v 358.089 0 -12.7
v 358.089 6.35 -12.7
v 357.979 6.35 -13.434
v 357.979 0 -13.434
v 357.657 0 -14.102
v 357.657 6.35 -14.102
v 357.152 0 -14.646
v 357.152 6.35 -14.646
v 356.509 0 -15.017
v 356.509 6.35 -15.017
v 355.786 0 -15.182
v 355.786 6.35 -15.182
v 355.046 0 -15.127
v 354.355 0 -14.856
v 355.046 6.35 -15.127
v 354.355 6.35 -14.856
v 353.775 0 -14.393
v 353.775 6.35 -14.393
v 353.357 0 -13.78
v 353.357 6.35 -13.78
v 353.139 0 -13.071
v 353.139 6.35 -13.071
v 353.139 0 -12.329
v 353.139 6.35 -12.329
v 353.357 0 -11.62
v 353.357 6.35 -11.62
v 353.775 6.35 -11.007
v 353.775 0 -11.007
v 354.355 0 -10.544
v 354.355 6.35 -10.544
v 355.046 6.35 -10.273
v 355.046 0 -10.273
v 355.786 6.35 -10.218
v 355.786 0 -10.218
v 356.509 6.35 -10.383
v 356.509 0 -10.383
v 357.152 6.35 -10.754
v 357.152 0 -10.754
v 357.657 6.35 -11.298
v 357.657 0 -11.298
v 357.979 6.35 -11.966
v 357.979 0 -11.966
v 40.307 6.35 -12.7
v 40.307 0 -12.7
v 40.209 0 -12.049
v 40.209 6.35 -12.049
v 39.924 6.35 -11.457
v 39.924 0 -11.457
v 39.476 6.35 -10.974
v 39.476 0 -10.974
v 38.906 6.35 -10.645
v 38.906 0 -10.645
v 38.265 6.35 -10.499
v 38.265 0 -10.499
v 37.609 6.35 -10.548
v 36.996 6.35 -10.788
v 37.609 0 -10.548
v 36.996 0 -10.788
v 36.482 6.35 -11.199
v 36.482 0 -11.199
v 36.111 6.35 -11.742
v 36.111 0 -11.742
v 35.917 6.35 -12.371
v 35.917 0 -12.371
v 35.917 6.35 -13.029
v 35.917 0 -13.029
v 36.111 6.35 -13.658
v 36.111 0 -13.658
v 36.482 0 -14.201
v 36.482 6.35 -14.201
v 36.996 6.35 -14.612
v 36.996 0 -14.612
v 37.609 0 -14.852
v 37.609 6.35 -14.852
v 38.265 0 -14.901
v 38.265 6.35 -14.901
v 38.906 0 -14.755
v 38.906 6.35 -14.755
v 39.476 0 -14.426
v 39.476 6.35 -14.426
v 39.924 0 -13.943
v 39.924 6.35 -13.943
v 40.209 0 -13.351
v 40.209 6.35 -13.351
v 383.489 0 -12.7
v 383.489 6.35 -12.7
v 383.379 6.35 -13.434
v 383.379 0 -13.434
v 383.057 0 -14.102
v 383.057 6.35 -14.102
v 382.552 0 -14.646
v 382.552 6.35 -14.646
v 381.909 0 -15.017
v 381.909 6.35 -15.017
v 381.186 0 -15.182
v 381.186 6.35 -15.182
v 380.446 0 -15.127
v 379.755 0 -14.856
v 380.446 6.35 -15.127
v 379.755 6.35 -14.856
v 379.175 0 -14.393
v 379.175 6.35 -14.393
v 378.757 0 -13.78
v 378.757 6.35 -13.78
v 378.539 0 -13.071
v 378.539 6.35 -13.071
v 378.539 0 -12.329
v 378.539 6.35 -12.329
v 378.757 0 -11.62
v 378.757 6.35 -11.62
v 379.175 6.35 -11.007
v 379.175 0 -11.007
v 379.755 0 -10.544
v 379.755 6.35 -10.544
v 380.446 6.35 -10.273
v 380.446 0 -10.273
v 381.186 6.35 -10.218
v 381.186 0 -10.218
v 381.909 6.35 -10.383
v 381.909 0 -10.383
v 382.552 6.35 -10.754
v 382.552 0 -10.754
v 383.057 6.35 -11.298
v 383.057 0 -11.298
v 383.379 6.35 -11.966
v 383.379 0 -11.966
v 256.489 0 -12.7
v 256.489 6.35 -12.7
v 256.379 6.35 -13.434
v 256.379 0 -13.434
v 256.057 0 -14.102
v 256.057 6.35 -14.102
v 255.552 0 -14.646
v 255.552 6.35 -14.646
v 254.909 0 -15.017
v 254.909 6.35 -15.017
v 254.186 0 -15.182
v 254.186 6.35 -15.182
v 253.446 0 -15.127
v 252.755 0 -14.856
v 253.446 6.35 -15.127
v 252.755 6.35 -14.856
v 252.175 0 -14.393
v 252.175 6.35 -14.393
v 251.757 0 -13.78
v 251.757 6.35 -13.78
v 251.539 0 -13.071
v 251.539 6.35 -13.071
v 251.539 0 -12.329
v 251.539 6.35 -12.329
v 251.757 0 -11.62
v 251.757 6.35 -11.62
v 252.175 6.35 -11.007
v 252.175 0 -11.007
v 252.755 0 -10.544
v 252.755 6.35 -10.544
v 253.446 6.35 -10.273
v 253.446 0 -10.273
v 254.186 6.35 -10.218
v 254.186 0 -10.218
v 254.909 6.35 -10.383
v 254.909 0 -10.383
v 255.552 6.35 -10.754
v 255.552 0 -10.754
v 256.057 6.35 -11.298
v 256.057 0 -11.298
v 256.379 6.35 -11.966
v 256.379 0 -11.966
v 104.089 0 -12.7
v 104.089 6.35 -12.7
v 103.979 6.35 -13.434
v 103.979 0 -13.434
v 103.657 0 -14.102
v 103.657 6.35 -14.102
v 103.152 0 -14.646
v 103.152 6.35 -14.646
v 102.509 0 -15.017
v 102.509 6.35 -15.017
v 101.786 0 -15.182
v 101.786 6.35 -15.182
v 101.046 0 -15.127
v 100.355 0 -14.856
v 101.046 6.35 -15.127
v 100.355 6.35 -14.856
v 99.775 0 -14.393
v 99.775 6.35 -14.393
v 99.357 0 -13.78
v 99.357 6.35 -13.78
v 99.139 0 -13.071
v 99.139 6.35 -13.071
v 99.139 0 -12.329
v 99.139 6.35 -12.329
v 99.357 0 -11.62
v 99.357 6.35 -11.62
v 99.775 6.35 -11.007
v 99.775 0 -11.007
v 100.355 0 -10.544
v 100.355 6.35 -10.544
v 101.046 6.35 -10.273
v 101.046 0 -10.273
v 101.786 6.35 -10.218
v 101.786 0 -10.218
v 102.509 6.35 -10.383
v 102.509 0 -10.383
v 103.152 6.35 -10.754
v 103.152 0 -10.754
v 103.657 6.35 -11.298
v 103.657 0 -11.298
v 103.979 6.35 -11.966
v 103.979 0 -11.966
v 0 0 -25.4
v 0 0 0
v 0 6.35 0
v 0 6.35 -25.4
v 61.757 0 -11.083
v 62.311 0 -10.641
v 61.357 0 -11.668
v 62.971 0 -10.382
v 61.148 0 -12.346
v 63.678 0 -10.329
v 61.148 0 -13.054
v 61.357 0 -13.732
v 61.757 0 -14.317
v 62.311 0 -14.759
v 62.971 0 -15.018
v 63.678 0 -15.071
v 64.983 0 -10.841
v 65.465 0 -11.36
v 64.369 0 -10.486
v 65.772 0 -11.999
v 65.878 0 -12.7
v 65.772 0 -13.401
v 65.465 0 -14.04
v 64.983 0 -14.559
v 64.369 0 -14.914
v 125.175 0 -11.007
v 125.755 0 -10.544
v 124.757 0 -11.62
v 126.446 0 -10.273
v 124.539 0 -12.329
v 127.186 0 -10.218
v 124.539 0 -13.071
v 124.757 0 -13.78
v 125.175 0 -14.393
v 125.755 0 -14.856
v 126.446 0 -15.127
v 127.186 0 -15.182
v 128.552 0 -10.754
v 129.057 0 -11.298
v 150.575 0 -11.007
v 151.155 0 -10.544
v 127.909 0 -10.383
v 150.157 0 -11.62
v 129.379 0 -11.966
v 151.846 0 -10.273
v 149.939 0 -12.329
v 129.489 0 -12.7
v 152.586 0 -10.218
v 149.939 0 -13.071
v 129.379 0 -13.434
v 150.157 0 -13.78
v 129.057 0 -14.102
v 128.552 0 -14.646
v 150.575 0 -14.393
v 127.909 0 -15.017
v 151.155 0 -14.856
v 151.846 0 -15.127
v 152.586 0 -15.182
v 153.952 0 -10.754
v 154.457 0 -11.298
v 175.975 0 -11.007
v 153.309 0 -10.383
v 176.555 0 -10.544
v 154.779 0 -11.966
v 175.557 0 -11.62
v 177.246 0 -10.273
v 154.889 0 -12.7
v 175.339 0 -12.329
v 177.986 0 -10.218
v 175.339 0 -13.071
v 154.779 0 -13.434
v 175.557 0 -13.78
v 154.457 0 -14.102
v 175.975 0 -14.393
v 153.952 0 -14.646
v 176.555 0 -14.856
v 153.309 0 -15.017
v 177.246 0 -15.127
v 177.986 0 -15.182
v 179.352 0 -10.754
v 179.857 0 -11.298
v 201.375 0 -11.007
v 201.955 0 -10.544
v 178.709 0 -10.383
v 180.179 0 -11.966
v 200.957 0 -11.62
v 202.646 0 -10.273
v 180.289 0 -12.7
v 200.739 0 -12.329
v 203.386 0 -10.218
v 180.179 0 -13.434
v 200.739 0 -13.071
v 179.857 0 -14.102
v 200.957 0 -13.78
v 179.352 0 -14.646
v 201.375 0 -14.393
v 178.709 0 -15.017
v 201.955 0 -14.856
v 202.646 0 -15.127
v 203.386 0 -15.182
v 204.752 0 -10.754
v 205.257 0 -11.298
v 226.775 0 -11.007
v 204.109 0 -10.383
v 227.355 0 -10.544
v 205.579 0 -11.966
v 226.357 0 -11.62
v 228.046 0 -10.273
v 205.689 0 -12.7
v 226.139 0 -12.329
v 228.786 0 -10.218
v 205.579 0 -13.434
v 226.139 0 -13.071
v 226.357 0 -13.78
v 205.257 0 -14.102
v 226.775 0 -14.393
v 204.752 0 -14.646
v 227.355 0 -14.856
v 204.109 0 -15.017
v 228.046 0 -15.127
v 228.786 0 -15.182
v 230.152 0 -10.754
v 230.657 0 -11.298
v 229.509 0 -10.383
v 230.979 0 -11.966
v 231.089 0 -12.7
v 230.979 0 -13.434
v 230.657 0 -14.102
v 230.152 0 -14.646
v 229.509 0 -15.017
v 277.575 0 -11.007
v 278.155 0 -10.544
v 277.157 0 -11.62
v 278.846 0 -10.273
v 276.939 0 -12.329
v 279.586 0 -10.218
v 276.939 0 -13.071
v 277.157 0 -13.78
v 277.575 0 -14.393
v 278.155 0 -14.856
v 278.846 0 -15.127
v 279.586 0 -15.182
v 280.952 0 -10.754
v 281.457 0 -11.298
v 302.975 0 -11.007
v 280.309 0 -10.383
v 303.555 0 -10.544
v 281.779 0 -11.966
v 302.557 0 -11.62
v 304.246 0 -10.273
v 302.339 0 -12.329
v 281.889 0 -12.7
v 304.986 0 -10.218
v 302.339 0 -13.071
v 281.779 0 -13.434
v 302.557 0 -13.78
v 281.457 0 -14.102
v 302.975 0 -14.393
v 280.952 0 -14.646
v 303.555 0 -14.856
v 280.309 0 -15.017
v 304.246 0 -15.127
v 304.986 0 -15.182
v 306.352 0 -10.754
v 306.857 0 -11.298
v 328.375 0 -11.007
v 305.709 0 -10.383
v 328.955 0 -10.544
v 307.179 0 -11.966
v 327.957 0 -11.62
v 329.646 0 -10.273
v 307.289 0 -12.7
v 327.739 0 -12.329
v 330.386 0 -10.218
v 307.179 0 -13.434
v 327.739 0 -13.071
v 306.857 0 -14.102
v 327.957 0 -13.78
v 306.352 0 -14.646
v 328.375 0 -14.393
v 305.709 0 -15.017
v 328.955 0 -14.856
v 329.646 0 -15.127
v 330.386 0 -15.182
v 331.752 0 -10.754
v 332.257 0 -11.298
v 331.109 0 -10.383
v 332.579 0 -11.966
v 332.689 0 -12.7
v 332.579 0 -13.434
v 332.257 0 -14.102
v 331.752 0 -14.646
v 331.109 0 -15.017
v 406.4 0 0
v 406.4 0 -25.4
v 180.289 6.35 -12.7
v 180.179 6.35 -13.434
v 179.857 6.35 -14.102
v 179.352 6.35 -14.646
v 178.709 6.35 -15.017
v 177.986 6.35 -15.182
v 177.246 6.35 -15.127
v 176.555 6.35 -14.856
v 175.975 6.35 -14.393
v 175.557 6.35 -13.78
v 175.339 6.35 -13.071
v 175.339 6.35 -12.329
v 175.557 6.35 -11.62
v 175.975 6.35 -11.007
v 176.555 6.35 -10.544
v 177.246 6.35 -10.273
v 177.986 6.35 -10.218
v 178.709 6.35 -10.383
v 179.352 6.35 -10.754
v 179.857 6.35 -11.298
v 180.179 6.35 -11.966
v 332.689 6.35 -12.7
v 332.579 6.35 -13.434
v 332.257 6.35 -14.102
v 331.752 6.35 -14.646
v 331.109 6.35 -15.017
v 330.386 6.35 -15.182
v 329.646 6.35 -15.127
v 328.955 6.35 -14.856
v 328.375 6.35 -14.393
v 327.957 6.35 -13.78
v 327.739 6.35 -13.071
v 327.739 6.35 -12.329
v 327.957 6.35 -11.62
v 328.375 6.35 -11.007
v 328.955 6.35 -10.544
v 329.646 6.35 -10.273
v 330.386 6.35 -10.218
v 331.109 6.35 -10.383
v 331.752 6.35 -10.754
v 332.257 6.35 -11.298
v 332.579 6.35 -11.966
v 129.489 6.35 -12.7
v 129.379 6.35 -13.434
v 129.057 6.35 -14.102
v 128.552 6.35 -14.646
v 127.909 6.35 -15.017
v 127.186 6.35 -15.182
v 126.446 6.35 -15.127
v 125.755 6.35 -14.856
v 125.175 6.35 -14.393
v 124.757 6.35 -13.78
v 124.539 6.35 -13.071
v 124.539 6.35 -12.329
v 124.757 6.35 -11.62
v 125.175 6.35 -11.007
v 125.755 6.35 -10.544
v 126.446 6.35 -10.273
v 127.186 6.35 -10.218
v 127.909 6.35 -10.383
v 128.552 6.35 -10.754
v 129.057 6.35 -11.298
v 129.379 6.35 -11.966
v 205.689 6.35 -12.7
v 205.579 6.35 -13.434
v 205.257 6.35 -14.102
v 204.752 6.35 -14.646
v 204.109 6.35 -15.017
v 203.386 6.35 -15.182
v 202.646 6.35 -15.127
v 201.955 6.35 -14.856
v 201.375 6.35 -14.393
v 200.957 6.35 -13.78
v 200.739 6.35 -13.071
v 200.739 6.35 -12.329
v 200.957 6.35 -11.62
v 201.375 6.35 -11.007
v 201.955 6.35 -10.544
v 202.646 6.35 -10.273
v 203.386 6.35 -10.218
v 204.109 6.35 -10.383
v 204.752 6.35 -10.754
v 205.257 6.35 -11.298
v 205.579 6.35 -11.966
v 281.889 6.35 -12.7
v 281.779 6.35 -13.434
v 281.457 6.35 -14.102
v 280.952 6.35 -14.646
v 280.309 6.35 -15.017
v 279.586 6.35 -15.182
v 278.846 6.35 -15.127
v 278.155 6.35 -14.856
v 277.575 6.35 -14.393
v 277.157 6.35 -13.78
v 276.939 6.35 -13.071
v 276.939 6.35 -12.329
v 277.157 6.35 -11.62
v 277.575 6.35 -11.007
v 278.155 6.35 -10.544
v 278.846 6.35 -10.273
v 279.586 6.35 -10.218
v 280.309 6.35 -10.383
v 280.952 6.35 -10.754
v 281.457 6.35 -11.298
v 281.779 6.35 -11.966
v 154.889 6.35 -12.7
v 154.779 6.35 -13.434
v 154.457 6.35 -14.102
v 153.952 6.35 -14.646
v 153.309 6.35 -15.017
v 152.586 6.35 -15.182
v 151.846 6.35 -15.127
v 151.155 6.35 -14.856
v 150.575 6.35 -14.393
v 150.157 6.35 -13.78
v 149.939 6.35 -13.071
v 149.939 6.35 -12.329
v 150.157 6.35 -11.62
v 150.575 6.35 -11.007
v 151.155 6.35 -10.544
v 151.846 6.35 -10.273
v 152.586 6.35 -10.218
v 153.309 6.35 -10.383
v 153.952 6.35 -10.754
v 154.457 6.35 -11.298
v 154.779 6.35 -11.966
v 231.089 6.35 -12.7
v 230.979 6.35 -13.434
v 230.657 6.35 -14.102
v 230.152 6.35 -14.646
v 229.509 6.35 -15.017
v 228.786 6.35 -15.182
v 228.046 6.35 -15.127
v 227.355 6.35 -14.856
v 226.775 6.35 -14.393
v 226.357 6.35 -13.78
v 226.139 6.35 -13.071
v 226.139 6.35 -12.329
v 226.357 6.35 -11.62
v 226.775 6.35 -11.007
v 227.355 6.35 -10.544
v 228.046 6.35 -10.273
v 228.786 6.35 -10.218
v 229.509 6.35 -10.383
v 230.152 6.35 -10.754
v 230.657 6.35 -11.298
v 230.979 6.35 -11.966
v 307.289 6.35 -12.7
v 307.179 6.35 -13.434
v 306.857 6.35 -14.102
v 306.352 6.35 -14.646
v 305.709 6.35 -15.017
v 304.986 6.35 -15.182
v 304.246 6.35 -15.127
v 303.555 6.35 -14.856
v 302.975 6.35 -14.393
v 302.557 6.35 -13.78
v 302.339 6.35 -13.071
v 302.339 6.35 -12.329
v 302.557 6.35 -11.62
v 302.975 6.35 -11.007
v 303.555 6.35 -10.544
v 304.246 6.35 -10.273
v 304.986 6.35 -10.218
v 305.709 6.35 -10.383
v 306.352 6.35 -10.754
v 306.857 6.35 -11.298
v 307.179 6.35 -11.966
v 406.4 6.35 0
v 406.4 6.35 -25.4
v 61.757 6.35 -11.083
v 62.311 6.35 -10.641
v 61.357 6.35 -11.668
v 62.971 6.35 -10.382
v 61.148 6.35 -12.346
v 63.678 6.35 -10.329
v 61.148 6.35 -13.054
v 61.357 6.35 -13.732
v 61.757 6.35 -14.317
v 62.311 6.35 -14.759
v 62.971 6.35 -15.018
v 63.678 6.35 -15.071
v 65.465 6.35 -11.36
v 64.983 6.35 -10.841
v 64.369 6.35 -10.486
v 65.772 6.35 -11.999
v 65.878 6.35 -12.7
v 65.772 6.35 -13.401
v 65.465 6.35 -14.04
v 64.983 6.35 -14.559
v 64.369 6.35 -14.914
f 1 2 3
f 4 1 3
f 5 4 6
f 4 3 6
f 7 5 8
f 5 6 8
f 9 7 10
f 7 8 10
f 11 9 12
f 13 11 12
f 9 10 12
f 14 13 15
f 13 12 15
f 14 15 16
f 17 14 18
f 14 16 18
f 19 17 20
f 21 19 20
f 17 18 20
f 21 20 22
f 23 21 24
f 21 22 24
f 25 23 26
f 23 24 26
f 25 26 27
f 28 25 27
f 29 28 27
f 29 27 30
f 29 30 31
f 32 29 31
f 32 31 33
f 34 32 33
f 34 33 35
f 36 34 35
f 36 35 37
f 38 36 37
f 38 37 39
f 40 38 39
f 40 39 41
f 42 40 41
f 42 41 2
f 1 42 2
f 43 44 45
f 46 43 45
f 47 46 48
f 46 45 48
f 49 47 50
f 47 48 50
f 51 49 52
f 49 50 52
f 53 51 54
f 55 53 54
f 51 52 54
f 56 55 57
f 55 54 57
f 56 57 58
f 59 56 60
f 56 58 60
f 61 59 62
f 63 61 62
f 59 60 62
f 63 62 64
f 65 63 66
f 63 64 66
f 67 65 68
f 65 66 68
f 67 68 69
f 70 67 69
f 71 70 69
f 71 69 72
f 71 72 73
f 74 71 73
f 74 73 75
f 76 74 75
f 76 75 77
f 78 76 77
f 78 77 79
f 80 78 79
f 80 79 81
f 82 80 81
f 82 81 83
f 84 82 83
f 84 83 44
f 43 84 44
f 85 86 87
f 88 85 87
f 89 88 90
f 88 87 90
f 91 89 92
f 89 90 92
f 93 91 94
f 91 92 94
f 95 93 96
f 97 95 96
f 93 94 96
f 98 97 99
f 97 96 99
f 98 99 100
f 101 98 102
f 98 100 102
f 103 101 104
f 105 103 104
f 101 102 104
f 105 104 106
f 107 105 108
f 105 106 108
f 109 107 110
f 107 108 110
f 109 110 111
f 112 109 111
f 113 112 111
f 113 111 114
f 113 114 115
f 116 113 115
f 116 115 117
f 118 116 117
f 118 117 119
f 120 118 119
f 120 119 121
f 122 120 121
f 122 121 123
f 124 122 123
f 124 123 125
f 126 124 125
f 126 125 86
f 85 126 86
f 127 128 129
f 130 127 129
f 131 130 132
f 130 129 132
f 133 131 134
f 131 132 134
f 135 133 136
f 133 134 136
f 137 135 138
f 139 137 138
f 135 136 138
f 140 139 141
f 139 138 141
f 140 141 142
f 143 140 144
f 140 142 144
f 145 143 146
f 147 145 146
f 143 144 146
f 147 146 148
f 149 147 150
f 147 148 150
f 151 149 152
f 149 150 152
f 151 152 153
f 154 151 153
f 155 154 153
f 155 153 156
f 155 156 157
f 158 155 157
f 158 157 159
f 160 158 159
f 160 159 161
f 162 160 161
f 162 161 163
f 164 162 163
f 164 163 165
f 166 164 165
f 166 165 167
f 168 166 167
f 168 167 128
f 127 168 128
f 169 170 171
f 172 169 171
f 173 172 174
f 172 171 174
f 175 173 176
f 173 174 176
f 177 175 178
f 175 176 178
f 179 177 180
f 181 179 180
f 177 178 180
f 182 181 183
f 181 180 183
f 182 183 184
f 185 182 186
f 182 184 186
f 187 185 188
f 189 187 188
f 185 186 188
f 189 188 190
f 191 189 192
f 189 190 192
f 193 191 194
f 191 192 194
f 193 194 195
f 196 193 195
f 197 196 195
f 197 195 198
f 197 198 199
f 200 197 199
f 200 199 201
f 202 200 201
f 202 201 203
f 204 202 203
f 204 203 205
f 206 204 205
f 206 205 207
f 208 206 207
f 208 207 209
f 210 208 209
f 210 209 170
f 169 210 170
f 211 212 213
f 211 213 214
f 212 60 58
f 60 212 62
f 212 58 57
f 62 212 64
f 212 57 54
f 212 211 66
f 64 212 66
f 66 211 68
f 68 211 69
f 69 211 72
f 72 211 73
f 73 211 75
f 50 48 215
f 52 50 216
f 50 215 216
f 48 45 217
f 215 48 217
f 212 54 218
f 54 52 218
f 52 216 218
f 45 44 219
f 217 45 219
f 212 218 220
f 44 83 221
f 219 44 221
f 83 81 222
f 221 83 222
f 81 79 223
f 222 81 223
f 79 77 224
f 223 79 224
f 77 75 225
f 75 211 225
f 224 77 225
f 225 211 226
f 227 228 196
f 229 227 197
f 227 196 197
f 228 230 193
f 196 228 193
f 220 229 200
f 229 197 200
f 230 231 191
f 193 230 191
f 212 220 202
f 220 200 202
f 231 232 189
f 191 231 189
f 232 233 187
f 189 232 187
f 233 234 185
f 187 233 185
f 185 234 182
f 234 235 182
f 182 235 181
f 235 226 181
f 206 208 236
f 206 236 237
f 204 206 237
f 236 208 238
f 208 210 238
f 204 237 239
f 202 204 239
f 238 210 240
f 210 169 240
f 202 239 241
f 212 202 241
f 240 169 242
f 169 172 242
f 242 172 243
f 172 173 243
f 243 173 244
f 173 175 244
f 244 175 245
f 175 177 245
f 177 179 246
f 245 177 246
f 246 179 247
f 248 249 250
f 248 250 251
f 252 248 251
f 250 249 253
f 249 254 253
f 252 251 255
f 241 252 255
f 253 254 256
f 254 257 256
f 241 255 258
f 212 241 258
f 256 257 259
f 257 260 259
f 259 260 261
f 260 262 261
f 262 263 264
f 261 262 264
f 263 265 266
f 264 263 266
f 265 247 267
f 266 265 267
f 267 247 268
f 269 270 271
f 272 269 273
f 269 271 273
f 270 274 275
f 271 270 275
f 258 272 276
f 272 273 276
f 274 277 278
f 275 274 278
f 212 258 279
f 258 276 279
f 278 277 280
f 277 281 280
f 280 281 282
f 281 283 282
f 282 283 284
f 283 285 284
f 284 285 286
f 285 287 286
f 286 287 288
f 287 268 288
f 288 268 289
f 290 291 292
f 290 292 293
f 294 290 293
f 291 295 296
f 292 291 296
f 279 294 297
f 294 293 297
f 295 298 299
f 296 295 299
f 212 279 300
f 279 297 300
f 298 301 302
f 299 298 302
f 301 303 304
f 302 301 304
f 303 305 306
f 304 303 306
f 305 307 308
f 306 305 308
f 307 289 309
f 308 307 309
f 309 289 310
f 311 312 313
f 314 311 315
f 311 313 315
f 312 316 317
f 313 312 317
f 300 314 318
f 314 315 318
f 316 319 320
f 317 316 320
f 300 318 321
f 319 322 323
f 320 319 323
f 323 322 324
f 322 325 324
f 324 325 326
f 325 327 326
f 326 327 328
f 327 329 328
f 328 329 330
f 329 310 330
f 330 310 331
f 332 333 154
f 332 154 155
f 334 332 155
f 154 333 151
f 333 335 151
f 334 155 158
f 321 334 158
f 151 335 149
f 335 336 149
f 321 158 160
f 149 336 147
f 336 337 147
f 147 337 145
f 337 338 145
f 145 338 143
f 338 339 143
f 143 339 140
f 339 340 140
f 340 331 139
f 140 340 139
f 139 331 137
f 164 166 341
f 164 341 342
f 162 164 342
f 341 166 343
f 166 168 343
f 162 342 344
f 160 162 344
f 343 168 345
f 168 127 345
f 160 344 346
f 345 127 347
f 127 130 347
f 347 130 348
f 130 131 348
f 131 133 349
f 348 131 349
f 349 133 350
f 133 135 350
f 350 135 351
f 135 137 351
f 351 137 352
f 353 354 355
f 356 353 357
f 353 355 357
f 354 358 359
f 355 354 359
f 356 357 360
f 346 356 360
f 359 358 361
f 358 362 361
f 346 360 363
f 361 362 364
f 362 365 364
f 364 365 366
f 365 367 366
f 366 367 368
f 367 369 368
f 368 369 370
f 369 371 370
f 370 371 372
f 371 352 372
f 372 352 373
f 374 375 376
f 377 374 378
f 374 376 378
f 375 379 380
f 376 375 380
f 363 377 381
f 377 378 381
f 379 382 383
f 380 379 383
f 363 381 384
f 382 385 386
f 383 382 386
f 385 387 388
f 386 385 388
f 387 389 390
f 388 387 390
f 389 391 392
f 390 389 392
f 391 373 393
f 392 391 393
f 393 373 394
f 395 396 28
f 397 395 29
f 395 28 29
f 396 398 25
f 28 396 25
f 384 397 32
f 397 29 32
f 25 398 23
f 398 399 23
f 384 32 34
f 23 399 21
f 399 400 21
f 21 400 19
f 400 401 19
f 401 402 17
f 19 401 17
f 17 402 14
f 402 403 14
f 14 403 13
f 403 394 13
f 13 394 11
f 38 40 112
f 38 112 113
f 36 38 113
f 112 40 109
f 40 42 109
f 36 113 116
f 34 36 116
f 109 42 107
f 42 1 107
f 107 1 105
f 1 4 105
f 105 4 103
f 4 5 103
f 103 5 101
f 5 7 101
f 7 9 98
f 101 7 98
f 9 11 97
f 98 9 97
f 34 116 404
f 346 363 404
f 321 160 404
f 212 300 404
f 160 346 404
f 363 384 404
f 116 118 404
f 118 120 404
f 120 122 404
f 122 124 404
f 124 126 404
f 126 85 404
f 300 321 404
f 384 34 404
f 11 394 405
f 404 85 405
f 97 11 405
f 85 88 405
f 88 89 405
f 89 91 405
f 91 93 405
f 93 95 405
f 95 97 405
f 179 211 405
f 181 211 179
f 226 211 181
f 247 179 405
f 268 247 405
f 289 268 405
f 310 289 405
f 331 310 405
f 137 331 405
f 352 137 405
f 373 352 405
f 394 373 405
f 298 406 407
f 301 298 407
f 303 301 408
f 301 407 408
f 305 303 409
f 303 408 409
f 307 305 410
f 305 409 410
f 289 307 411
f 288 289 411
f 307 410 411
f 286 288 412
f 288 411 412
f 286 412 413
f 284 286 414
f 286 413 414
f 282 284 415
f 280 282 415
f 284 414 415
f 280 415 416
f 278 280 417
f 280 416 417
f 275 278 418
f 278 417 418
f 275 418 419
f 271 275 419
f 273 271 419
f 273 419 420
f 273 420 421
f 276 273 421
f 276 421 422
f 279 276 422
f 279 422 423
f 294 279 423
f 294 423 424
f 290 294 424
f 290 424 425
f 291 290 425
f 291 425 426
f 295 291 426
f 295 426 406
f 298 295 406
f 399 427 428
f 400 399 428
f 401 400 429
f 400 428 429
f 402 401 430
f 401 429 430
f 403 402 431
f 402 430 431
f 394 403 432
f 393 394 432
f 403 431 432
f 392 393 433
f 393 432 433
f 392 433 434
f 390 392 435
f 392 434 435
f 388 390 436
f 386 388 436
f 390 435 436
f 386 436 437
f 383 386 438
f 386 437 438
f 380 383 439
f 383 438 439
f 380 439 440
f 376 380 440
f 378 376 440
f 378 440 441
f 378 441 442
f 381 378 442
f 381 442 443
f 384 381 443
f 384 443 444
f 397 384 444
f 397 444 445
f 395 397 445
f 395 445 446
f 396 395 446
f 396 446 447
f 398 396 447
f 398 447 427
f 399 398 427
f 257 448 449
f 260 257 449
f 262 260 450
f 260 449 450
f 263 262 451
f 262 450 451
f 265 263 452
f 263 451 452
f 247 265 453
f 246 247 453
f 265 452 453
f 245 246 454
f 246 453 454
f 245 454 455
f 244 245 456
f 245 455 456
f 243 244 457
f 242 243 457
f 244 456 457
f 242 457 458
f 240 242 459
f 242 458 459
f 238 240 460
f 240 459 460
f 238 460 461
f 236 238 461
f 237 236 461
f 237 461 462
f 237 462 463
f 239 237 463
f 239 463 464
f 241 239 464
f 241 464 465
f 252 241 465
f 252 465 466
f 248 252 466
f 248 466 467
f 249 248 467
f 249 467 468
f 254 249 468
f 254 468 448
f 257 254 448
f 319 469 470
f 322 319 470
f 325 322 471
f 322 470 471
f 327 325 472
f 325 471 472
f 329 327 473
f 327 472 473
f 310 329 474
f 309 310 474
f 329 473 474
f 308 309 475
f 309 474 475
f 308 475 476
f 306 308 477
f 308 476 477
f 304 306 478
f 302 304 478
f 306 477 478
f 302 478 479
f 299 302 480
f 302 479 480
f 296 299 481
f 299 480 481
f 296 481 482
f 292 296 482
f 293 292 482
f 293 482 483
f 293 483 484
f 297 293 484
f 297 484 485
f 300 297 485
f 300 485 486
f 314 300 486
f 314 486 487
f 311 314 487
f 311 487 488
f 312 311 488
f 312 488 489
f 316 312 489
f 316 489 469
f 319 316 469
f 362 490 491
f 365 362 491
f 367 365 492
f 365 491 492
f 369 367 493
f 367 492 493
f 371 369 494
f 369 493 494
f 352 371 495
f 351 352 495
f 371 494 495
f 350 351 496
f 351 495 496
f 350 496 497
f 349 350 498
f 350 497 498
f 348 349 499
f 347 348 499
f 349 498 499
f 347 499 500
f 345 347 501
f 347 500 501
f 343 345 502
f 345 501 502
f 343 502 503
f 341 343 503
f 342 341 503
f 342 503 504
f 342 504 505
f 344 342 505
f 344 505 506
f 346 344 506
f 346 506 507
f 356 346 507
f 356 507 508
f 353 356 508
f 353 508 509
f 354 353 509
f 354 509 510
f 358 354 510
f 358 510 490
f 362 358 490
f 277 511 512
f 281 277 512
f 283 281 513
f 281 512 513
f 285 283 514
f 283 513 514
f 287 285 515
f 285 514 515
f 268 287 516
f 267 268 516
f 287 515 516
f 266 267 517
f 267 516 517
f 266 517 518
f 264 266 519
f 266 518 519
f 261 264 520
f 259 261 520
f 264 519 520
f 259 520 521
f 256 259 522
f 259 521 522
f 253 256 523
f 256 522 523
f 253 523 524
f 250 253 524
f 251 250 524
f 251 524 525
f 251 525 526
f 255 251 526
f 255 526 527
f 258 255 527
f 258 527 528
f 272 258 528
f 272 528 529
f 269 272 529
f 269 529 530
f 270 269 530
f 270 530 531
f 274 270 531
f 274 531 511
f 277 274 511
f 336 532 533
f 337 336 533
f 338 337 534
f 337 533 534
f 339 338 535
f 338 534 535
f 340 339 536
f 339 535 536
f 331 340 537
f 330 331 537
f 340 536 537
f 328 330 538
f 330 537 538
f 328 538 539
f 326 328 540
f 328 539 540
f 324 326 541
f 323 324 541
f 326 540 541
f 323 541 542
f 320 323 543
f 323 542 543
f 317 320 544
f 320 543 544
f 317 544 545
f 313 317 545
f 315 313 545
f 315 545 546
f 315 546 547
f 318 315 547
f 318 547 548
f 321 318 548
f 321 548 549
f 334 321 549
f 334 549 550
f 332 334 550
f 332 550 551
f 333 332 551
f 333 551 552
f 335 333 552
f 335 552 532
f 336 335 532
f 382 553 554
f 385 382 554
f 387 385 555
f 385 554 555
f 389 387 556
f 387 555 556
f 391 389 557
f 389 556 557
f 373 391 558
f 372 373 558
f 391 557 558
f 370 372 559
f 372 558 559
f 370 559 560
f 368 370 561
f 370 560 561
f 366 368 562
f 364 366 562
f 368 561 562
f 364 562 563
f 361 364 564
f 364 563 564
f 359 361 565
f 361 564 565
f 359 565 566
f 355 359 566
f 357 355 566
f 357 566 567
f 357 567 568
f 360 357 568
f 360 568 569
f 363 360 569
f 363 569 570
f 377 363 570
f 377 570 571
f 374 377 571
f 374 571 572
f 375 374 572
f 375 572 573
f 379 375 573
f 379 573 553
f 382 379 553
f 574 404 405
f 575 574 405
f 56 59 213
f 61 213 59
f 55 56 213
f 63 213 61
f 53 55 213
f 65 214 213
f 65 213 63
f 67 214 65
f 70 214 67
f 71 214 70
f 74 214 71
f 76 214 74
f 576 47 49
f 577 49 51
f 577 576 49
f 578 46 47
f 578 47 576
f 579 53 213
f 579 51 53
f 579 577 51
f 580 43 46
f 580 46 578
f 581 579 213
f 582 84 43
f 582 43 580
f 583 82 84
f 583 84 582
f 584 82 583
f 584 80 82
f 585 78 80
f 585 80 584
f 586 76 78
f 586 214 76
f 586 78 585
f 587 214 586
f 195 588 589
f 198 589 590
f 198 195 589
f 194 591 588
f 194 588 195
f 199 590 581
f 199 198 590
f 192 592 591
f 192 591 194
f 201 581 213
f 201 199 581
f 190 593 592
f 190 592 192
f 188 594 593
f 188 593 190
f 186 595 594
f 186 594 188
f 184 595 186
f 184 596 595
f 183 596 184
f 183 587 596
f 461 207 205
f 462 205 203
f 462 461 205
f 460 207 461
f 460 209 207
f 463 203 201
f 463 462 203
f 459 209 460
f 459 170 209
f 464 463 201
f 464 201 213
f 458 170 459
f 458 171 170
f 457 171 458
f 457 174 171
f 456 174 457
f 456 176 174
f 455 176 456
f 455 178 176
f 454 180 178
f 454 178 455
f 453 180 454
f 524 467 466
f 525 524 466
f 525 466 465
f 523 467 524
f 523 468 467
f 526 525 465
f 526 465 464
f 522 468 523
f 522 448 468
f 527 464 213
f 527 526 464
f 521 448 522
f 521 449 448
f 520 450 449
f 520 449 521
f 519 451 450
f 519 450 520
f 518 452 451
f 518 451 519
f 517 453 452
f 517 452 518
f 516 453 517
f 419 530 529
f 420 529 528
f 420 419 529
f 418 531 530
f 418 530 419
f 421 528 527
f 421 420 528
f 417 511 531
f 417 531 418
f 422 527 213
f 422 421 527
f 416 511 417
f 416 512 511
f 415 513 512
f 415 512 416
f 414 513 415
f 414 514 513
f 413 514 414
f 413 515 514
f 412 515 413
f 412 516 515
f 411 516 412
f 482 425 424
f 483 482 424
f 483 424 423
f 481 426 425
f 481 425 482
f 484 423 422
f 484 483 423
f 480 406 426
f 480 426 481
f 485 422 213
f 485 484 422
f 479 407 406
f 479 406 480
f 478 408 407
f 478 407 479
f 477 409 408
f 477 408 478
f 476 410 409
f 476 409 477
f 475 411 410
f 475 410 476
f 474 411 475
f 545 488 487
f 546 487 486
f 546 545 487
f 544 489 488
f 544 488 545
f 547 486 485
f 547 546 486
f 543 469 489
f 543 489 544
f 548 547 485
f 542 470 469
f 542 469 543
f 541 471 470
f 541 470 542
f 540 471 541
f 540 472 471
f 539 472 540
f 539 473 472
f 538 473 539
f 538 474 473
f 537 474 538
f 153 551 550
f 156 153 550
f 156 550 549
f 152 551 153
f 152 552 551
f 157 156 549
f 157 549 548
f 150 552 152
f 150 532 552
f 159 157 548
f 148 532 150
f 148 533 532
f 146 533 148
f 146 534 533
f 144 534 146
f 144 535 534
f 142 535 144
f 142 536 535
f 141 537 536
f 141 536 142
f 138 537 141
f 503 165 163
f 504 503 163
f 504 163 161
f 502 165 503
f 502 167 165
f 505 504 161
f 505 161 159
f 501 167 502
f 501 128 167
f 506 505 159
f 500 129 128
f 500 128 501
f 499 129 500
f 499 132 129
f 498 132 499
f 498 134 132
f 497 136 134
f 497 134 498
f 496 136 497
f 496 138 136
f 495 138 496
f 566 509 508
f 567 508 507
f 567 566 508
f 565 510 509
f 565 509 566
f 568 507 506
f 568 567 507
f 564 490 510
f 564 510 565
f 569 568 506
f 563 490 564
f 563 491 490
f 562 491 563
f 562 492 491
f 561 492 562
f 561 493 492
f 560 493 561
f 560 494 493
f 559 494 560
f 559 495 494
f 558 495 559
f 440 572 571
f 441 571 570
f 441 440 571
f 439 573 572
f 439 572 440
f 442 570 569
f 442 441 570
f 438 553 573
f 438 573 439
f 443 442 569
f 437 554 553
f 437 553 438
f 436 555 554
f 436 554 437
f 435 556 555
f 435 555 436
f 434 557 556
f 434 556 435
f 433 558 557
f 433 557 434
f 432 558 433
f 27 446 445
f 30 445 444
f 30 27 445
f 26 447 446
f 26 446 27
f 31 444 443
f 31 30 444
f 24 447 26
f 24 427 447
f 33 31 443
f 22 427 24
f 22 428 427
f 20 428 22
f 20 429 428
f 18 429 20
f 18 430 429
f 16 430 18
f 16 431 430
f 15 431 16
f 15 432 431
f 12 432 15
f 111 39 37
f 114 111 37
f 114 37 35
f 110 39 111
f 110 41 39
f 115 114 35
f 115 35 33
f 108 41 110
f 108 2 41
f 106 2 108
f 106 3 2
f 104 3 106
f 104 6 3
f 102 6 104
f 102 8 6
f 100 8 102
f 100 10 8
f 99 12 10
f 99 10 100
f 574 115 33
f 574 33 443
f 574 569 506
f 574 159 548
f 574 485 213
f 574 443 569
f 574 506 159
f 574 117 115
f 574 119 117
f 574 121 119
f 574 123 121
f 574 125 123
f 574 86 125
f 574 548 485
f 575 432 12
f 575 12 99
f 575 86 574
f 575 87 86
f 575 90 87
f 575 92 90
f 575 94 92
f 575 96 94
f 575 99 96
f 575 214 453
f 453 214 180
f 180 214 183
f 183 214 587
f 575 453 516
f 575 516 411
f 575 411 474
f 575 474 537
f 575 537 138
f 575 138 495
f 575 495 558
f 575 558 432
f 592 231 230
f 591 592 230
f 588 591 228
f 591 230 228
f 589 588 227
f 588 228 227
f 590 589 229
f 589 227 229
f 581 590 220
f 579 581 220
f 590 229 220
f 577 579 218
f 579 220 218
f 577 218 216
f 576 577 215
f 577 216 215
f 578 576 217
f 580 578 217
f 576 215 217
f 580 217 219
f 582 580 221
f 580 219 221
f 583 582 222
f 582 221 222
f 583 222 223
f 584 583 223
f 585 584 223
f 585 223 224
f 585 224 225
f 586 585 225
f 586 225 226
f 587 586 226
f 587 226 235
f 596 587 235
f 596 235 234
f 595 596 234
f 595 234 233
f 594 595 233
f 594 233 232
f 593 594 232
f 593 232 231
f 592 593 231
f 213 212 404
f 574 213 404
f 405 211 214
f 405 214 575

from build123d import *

# Parameters (mm, degrees)
SKETCH1_W               = 406.4
SKETCH1_H               = 25.4
BOSS_EXTRUDE1_DEPTH     = 6.35
SKETCH2_R               = 2.4892
CUT_EXTRUDE1_DEPTH      = 1
CUT_EXTRUDE1_DEPTH_BACK = 7.35
SKETCH3_R               = 2.378070279
SKETCH3_R_2             = 2.20737703
CUT_EXTRUDE2_DEPTH      = 7.35


with BuildPart() as part:
    # Sketch1 → Boss-Extrude1 (new body)
    with BuildSketch(Plane(origin=(0, 0, 0), x_dir=(1, 0, 0), z_dir=(0, 1, 0))):
        with Locations((203.2, 12.7)):
            Rectangle(SKETCH1_W, SKETCH1_H)
    extrude(amount=BOSS_EXTRUDE1_DEPTH)

    # Sketch2 → Cut-Extrude1 (cut, two sides)
    with BuildSketch(Plane(origin=(0, 6.35, 0), x_dir=(1, 0, 0), z_dir=(0, 1, 0))) as cut_extrude1_sk:
        with Locations((381, 12.7)):
            Circle(SKETCH2_R)
        with Locations((355.6, 12.7)):
            Circle(SKETCH2_R)
        with Locations((330.2, 12.7)):
            Circle(SKETCH2_R)
        with Locations((304.8, 12.7)):
            Circle(SKETCH2_R)
        with Locations((279.4, 12.7)):
            Circle(SKETCH2_R)
        with Locations((254, 12.7)):
            Circle(SKETCH2_R)
        with Locations((228.6, 12.7)):
            Circle(SKETCH2_R)
        with Locations((203.2, 12.7)):
            Circle(SKETCH2_R)
        with Locations((177.8, 12.7)):
            Circle(SKETCH2_R)
        with Locations((152.4, 12.7)):
            Circle(SKETCH2_R)
        with Locations((127, 12.7)):
            Circle(SKETCH2_R)
        with Locations((101.6, 12.7)):
            Circle(SKETCH2_R)
    extrude(amount=CUT_EXTRUDE1_DEPTH, mode=Mode.SUBTRACT)
    extrude(cut_extrude1_sk.sketch, amount=-CUT_EXTRUDE1_DEPTH_BACK, mode=Mode.SUBTRACT)

    # Sketch3 → Cut-Extrude2 (cut, through all)
    with BuildSketch(Plane.XZ):
        with Locations((63.5, -12.7)):
            Circle(SKETCH3_R)
        with Locations((38.1, -12.7)):
            Circle(SKETCH3_R_2)
    extrude(amount=-CUT_EXTRUDE2_DEPTH, mode=Mode.SUBTRACT)


solid = part.part
